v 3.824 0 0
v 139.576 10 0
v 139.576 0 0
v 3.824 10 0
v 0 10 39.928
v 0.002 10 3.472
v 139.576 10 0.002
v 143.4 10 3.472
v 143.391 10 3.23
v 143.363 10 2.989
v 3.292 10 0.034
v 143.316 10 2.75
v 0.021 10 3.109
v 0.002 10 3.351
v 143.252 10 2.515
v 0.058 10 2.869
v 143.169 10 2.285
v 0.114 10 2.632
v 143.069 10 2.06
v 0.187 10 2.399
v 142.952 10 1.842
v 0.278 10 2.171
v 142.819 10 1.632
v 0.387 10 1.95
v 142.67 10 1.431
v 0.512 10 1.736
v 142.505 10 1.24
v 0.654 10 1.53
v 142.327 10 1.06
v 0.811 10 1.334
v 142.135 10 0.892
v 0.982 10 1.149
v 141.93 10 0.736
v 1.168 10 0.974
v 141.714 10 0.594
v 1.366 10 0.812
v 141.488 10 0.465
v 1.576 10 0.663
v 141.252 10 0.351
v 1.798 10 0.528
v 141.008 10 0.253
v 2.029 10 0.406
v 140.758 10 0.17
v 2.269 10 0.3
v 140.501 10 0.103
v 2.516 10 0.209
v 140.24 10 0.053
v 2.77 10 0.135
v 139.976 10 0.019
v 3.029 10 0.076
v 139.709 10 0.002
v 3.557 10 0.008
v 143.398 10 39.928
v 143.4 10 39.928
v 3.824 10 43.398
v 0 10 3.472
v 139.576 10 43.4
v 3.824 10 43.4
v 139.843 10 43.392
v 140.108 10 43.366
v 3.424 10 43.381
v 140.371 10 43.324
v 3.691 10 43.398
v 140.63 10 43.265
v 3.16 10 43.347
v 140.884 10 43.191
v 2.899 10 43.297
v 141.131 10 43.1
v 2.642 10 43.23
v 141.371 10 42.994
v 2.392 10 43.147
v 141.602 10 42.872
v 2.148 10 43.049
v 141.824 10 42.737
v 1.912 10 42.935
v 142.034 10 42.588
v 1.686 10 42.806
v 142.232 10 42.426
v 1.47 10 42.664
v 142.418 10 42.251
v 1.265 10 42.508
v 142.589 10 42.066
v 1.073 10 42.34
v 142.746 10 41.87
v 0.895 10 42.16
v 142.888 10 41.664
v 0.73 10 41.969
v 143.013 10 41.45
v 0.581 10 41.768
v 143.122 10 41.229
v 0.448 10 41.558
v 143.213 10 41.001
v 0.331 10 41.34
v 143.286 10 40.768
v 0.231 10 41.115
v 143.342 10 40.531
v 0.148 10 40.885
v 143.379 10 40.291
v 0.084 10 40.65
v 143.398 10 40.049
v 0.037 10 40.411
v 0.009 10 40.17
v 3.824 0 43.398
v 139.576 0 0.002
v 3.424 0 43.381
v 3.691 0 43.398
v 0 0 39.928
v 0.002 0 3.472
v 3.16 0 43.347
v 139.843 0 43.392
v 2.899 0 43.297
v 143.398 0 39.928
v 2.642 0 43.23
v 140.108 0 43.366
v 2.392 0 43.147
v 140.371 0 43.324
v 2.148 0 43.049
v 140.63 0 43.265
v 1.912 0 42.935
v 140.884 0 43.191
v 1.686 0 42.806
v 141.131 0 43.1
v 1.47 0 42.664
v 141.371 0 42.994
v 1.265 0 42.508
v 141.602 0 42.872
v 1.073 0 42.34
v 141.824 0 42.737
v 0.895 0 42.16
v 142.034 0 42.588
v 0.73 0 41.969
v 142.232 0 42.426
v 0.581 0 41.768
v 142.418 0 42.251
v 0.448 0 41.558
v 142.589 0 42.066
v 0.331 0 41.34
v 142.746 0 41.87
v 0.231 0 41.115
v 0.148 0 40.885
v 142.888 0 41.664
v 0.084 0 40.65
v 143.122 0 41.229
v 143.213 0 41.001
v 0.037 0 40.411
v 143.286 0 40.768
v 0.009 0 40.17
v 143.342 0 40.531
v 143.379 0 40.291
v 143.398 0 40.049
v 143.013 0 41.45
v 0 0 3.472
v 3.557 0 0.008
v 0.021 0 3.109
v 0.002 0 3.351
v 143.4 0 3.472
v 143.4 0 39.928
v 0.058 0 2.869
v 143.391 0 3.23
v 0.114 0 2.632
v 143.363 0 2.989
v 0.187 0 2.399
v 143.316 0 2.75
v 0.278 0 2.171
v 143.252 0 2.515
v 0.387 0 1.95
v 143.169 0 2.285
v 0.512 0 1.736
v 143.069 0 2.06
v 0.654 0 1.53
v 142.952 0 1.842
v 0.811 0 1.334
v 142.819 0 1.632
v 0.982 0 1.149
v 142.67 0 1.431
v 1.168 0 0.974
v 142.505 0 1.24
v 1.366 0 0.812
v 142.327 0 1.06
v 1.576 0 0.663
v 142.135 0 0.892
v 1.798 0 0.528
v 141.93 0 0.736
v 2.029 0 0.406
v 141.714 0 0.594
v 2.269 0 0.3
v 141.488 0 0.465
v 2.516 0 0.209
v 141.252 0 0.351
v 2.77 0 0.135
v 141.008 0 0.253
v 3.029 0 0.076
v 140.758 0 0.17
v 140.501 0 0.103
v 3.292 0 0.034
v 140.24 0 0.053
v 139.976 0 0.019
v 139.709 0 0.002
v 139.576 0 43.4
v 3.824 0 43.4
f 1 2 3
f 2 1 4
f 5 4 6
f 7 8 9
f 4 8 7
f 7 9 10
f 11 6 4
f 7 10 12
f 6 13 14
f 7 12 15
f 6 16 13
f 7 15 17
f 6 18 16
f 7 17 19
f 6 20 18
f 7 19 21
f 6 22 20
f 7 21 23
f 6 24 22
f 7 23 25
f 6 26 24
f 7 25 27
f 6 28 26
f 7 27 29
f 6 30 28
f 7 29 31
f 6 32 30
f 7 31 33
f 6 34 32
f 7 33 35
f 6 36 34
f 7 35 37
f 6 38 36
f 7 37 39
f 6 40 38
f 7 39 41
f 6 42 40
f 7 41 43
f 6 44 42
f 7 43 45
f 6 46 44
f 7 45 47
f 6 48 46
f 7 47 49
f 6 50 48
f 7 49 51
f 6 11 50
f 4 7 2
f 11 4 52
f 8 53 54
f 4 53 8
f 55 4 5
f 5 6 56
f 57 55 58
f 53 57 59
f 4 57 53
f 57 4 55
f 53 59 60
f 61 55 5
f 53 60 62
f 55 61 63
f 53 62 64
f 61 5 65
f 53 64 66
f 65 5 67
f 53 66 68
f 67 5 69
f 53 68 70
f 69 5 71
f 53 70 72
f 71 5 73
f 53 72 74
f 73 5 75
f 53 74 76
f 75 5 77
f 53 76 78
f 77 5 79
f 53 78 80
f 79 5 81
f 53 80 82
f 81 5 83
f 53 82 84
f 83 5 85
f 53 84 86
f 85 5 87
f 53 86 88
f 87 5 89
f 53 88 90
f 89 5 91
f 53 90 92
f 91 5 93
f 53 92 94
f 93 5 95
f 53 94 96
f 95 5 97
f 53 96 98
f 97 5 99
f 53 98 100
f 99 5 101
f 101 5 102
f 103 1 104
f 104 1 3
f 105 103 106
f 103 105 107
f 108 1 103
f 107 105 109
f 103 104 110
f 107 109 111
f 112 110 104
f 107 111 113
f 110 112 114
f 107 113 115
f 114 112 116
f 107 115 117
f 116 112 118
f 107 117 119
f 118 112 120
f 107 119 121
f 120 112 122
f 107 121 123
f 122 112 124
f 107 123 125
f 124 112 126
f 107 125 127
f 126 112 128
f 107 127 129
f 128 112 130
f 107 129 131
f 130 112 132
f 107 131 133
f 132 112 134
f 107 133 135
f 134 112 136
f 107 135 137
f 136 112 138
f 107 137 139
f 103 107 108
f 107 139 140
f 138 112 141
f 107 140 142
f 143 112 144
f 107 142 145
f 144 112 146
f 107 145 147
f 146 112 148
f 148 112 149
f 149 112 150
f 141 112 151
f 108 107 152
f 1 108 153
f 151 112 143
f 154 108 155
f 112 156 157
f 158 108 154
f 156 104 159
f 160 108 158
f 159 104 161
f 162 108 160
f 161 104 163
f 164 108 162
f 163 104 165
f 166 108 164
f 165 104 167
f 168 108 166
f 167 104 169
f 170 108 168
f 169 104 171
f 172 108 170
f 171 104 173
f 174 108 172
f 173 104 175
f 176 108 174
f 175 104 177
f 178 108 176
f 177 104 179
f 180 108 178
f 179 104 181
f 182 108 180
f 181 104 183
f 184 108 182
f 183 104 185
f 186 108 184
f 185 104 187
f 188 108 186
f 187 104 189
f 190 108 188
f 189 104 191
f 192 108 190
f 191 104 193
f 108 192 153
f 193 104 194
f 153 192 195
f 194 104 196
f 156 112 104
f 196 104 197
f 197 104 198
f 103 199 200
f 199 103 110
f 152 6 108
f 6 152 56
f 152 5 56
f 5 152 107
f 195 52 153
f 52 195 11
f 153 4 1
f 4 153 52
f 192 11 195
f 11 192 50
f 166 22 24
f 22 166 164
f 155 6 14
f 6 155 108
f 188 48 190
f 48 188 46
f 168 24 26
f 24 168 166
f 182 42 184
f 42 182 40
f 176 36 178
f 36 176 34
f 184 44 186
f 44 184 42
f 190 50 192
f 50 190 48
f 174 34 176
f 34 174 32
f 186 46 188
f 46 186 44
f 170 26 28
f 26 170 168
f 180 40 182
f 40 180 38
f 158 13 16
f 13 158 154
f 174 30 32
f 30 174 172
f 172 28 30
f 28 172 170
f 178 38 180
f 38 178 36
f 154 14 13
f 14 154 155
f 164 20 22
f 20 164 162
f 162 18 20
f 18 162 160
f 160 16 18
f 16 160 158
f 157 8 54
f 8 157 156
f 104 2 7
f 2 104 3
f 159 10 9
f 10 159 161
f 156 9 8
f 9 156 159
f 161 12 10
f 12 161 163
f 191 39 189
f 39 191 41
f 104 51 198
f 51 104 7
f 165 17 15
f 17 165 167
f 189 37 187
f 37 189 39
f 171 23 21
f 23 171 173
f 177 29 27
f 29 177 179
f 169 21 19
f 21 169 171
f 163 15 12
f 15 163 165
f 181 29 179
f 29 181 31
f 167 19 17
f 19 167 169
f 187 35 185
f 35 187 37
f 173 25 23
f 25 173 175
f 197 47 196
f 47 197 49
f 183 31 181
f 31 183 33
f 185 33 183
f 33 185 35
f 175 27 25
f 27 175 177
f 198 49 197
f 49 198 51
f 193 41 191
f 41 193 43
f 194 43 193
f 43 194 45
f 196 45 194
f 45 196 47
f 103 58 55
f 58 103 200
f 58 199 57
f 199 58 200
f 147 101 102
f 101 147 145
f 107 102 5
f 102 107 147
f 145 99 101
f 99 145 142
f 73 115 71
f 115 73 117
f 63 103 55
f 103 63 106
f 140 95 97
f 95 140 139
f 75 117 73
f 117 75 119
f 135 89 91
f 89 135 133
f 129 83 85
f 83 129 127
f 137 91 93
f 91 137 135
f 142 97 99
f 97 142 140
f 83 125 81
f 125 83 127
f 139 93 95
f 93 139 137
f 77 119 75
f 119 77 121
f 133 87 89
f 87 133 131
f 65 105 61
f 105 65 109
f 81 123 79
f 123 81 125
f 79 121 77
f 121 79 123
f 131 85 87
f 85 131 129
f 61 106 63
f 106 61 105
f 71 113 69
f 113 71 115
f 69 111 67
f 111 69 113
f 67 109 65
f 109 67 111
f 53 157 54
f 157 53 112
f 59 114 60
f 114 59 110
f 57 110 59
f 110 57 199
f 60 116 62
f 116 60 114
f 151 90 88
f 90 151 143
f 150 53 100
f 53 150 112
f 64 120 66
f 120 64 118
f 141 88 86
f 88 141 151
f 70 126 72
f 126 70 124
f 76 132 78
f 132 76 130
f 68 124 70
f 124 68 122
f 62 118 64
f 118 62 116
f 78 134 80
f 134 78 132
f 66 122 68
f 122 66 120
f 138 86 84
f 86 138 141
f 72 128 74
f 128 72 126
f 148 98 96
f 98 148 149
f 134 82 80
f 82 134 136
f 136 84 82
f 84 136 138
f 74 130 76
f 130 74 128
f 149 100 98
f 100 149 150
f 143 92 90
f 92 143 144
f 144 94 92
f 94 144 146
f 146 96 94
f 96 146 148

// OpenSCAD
// file: ../../modules/hexagon.scad
module hexagon(r = 1) {
  polygon([
    [-1 * r, 0],
    [-.5 * r, r * sqrt(3) / 2],
    [.5 * r, r * sqrt(3) / 2],
    [1 * r, 0],
    [.5 * r, r * sqrt(3) / -2],
    [-.5 * r, r * sqrt(3) / -2],
  ]);
}
// file: ../../modules/fillet.scad
module fillet(r, l) {
  difference() {
    cube([r, r, l]);
    translate([0, 0, -.1]) cylinder(h = l + .2, r = r);
  }
}
// file: _common.scad
include <../../modules/fillet.scad>
include <../../modules/hexagon.scad>

$fa=4; // default minimum facet angle is now 0.5
$fs=0.05; // default minimum facet size is now 0.05 mm

unit = 50;

unitsWide = 3;
unitsTall = 1;

height = unitsTall * unit;
width = unitsWide * unit;
depth = 150;

wallThickness = 2.8;
sphereDetentRad = 2.4;

filletRad = 4;

tolerance = 0.5;

// M3 screw
screwRad = 1.6;
screwHeadRad = 3;
nutRad = 3.2;


module baseShape() {
  difference() {
    cube([width, depth, height]);
    translate([filletRad, 0, filletRad]) rotate([90, 90, 180]) fillet(r = filletRad, l = depth);
    translate([width - filletRad, 0, filletRad]) rotate([90, 180, 180]) fillet(r = filletRad, l = depth);
    translate([filletRad, 0, height - filletRad]) rotate([90, 0, 180]) fillet(r = filletRad, l = depth);
    translate([width - filletRad, 0, height - filletRad]) rotate([90, -90, 180]) fillet(r = filletRad, l = depth);
  }
}
// main file
include <_common.scad>

// Outer Rim
// difference() {
//   resize([width, 10, height]) baseShape();
//   translate([wallThickness, 0, wallThickness]) resize([width - wallThickness * 2, 10, height - wallThickness * 2]) baseShape();
// }

// Inner Drawer
difference() {
    resize([width - wallThickness * 2 - tolerance * 2, 10, height - wallThickness * 2 - tolerance * 2]) baseShape();
}
